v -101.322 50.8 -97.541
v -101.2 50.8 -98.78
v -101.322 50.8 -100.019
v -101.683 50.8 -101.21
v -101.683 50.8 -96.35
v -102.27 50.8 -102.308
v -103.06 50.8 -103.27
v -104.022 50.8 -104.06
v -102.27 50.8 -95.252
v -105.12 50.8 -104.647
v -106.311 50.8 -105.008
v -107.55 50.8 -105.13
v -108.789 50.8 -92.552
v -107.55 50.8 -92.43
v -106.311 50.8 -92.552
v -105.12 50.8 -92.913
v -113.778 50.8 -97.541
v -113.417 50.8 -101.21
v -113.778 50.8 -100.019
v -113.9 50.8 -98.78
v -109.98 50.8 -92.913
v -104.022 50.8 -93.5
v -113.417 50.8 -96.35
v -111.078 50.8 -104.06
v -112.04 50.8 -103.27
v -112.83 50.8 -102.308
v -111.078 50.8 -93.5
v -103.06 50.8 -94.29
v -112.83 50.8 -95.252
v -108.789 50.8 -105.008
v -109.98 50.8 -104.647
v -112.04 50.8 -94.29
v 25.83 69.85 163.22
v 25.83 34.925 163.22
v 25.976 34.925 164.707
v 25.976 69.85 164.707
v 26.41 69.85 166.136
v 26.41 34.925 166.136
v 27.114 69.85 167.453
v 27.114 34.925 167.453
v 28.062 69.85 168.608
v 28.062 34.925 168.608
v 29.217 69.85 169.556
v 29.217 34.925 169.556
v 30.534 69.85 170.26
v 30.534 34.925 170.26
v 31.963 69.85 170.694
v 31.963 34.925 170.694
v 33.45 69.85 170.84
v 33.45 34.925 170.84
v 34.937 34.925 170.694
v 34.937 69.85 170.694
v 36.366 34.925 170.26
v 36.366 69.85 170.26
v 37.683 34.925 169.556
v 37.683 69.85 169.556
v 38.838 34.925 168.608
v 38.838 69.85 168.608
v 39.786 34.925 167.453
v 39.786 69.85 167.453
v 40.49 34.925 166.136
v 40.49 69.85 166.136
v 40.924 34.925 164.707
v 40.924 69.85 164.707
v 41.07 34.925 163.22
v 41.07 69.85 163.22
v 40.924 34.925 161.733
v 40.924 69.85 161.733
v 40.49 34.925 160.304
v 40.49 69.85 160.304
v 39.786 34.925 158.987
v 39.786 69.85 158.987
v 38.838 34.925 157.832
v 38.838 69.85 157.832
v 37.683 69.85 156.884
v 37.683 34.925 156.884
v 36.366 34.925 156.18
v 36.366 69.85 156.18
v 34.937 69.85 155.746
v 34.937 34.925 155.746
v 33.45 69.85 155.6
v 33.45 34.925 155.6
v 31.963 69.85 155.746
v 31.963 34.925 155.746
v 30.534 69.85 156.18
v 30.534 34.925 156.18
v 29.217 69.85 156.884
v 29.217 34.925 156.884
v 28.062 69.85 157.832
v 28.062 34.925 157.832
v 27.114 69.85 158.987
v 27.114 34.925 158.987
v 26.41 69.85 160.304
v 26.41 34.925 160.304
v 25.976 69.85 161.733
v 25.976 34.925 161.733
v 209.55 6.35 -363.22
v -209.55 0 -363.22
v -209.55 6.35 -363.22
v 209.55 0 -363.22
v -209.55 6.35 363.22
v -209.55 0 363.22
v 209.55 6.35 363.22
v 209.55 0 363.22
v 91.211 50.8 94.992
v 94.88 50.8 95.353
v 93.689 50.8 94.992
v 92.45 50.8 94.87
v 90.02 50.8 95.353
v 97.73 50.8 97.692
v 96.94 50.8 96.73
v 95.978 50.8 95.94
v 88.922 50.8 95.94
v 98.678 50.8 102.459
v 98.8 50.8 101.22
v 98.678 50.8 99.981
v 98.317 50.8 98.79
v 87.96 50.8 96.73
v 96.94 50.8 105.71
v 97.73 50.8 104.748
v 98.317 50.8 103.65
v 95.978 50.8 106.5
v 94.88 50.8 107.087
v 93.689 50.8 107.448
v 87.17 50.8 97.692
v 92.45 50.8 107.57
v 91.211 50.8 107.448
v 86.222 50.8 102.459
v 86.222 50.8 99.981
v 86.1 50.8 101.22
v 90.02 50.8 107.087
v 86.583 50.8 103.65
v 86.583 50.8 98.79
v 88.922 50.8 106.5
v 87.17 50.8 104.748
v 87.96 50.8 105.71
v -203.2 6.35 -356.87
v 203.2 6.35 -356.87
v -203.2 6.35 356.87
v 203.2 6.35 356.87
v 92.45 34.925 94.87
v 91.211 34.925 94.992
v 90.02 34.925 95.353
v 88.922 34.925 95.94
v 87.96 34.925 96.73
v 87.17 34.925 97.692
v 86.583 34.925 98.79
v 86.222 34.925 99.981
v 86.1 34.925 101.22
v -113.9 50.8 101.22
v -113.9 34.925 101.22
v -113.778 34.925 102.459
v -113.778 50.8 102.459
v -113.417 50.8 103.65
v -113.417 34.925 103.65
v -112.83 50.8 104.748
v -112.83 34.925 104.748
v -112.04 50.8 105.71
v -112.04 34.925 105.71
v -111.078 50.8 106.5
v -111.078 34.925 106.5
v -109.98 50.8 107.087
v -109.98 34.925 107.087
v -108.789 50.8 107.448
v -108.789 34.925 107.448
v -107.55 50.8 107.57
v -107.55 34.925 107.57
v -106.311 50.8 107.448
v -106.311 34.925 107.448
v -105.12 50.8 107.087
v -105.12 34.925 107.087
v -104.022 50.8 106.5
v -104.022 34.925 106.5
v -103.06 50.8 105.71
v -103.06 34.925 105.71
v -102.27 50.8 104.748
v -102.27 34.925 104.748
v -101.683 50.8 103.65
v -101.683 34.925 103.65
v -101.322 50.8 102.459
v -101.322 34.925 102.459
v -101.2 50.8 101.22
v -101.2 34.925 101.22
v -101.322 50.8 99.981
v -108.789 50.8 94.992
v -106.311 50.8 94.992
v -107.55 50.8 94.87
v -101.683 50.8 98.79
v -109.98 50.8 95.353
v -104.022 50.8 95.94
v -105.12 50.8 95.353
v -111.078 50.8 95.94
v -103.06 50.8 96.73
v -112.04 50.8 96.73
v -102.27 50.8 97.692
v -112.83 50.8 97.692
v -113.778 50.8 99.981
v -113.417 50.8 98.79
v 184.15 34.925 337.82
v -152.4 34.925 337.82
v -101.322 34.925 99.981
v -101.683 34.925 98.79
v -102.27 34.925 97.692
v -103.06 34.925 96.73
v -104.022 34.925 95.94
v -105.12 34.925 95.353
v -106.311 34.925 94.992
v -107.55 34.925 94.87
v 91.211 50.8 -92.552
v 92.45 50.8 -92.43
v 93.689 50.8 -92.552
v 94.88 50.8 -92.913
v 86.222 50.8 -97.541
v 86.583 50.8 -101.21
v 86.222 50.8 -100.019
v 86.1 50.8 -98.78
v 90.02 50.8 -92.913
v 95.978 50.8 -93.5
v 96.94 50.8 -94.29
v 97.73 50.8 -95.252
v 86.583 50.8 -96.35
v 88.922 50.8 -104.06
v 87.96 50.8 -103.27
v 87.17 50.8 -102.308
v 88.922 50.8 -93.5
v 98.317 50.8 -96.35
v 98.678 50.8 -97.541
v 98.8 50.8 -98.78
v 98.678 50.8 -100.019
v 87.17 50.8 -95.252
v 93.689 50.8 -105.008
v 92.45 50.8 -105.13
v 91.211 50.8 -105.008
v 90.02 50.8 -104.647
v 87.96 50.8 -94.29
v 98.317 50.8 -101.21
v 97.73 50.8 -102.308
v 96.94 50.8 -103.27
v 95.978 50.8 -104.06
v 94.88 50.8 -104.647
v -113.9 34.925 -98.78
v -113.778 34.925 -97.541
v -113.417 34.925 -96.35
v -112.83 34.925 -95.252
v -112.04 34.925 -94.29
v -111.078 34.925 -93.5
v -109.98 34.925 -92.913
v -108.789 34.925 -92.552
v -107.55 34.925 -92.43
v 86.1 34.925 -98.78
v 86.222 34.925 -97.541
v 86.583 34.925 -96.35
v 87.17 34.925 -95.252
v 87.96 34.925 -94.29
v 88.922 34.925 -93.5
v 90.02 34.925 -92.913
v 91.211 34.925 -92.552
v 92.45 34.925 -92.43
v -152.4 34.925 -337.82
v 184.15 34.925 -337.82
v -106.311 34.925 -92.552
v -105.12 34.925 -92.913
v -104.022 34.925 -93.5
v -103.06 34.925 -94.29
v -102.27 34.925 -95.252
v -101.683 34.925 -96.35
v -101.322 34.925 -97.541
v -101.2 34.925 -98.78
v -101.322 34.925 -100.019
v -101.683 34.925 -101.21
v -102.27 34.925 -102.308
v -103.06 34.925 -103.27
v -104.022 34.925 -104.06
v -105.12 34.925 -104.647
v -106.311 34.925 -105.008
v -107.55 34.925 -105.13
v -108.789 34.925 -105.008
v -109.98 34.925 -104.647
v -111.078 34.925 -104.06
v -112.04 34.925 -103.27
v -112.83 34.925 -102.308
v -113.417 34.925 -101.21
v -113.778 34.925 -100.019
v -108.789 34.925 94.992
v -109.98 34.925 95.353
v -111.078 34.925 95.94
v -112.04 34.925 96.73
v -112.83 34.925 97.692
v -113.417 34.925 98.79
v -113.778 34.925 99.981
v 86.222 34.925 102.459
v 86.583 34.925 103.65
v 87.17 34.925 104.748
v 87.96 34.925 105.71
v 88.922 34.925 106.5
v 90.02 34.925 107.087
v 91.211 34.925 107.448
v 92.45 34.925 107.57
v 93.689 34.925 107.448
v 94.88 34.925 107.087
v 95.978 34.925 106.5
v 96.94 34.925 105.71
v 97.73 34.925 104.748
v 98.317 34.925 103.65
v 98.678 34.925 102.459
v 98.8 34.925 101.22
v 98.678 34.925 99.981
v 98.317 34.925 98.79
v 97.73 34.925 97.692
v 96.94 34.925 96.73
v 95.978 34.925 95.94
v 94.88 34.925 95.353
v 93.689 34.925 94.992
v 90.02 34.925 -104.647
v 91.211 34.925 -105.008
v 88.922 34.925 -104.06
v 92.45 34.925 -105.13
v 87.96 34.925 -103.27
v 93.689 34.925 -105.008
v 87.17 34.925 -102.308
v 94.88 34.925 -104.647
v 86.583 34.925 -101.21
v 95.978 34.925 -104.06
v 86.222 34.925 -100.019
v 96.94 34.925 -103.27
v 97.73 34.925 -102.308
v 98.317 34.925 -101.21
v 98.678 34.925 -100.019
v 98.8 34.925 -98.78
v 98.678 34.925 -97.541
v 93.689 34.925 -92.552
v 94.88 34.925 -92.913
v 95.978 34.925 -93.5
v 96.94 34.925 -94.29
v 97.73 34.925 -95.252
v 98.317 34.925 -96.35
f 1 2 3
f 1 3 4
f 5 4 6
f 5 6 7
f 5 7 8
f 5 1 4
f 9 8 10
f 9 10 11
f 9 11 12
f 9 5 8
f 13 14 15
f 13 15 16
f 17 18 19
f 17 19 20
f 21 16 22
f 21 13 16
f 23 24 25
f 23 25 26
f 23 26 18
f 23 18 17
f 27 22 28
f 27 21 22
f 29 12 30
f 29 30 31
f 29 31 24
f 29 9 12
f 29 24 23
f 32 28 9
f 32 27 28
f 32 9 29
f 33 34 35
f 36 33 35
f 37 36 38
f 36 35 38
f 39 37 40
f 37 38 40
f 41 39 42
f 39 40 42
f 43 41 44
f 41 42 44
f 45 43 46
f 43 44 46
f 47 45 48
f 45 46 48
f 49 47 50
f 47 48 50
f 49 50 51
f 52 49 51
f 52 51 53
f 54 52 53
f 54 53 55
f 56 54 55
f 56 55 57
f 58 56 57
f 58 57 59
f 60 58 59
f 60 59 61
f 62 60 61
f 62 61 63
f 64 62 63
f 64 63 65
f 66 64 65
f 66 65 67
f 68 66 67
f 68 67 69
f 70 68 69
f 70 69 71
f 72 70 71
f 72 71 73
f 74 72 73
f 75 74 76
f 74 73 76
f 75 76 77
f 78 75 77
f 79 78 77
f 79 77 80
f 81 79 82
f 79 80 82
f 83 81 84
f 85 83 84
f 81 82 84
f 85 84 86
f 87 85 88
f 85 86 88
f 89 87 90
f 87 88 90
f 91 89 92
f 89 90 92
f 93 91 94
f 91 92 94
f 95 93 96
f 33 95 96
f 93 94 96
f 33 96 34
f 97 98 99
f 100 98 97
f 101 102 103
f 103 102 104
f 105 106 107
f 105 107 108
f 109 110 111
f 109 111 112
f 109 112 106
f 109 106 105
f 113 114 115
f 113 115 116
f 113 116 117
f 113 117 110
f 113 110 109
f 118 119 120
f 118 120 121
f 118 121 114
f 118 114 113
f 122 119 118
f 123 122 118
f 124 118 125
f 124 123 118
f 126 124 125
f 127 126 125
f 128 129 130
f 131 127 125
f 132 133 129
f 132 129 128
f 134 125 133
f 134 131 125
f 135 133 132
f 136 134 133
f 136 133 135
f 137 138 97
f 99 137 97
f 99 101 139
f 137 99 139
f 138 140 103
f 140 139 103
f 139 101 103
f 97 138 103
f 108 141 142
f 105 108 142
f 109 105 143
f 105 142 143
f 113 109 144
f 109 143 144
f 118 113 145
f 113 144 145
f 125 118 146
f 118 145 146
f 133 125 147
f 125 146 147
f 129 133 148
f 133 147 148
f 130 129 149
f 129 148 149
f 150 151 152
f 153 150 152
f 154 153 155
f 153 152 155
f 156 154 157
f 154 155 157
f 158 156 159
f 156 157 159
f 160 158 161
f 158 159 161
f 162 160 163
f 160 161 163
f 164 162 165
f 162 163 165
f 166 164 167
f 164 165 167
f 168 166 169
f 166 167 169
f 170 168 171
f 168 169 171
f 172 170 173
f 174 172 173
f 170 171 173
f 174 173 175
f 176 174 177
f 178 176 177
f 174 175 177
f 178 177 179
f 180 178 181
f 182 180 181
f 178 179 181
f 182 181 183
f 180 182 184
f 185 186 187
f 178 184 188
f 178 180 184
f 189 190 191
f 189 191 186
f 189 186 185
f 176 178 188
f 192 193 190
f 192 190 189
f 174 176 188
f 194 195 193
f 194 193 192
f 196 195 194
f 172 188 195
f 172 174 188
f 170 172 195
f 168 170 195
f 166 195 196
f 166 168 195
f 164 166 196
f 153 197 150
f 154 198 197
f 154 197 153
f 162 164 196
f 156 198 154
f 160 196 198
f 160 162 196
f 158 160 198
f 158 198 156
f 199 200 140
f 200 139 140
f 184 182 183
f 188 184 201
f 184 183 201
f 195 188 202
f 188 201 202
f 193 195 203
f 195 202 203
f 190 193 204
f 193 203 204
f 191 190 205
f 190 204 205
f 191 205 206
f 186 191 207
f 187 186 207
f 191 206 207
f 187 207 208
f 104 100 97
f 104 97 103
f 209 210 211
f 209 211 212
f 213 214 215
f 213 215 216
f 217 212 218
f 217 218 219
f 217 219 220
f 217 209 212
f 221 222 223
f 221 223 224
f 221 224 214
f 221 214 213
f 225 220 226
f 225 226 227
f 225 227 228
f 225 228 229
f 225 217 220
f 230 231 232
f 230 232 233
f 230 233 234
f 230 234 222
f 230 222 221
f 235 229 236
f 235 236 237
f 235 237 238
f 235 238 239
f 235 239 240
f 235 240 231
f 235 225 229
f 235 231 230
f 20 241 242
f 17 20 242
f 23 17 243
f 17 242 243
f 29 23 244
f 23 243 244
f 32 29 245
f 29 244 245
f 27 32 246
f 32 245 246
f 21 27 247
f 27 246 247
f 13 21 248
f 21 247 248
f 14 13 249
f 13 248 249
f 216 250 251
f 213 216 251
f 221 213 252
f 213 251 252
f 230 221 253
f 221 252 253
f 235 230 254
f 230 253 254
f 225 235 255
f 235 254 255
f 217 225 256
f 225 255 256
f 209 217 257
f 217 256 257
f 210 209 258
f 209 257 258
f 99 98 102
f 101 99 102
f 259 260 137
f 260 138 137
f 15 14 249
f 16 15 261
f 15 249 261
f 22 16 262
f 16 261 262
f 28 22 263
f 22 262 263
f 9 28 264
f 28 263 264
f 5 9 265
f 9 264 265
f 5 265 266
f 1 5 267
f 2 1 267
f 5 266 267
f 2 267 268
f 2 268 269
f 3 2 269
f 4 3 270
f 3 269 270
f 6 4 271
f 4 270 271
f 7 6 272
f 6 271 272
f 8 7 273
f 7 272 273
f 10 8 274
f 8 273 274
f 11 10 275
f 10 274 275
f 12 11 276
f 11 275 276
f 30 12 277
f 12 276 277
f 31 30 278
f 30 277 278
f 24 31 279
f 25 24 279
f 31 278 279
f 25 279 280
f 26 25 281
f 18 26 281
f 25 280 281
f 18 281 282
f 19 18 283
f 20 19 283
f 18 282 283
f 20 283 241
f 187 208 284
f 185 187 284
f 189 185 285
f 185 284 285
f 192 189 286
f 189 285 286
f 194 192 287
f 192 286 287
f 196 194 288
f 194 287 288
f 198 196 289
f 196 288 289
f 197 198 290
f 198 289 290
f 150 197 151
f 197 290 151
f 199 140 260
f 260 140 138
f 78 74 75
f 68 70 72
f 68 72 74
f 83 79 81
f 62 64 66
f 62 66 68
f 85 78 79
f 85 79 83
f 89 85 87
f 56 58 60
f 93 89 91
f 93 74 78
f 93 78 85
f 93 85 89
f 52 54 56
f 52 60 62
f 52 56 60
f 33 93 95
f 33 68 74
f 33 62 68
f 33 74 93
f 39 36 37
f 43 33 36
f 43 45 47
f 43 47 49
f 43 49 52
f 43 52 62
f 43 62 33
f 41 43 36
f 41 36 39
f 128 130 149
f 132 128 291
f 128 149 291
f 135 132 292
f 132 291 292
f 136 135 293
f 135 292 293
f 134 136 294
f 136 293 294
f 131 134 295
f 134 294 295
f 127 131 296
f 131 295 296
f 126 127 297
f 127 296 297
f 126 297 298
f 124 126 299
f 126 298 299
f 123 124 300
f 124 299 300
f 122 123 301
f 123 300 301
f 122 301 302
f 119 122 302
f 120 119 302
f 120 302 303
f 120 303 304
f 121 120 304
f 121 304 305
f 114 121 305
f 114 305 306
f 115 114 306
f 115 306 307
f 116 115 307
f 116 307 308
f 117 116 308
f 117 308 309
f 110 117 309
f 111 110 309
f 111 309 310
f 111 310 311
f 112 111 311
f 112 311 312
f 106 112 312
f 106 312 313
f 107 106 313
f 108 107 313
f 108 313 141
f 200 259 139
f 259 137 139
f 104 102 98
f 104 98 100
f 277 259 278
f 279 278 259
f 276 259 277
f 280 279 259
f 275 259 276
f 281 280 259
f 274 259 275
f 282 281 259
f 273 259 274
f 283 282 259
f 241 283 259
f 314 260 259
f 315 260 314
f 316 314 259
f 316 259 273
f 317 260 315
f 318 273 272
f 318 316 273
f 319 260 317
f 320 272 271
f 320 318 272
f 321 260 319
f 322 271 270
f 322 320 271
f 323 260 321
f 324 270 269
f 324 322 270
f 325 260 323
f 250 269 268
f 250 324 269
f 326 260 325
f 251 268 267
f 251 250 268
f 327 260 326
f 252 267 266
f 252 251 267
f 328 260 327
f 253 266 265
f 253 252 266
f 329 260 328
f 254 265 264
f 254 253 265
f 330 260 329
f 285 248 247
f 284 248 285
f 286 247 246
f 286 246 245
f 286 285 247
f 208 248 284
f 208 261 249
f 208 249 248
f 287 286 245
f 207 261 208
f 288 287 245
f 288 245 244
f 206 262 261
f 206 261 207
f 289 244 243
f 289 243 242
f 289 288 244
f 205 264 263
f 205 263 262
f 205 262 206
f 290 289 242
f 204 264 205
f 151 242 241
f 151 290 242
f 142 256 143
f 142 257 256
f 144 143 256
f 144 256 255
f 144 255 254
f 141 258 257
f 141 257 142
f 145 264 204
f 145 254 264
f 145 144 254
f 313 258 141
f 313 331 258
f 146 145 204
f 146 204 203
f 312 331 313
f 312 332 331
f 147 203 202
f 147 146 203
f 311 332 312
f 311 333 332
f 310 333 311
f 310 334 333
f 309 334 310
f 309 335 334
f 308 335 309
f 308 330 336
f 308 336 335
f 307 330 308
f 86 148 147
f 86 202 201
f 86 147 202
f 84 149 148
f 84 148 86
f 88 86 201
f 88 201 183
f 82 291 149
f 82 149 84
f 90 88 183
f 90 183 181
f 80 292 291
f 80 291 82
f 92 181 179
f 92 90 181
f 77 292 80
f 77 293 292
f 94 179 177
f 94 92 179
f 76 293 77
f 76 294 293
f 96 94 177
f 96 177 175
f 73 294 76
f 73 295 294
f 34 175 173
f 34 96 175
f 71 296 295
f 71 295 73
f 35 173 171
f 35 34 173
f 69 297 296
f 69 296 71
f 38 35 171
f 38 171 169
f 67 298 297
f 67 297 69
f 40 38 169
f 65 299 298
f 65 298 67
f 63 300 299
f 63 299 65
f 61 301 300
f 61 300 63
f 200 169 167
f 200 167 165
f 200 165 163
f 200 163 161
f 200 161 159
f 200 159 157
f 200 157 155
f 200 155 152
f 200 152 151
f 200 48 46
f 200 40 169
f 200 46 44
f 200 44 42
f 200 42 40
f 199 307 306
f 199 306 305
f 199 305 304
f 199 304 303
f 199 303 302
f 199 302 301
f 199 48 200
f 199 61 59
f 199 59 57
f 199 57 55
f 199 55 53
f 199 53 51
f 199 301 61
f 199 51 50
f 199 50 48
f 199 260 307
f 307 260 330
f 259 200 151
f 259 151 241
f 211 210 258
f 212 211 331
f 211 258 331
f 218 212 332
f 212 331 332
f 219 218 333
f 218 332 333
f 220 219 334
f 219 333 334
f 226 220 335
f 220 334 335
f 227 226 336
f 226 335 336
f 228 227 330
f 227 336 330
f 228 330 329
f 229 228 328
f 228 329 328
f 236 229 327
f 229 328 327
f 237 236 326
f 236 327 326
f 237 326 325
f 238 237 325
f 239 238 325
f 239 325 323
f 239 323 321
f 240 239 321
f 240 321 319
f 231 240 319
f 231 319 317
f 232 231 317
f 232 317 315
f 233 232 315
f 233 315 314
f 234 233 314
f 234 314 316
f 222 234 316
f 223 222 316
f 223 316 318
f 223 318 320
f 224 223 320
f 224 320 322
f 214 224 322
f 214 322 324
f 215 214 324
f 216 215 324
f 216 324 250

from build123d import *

# Parameters (mm, degrees)
F0_W      = 419.1
F0_H      = 726.44
F1_DEPTH  = 6.35
F4_DEPTH  = 44.45
F5_R      = 7.62
F6_DEPTH  = 63.5
F8_W      = 336.55
F8_H      = 675.64
F9_W      = 406.4
F9_H      = 713.74
F11_DEPTH = 28.575


with BuildPart() as f1:
    # F0 (on Front) → F1 (new body)
    with BuildSketch(Plane.XZ):
        Rectangle(F0_W, F0_H)
    extrude(amount=-F1_DEPTH)

    # F2 (on face) → F4 (join)
    with BuildSketch(Plane(origin=(0, 6.35, 0), x_dir=(-1, 0, 0), z_dir=(0, 1, 0))):
        with BuildLine():
            ThreePointArc((113.9, 101.22), (107.55, 107.57), (101.2, 101.22))
            Line((101.2, 101.22), (107.55, 101.22))
            Line((107.55, 101.22), (107.55, 94.87))
            ThreePointArc((107.55, 94.87), (112.0401280605, 96.7298719395), (113.9, 101.22))
        make_face()
        with BuildLine():
            Line((107.55, 101.22), (101.2, 101.22))
            ThreePointArc((101.2, 101.22), (103.0598719395, 96.7298719395), (107.55, 94.87))
            Line((107.55, 94.87), (107.55, 101.22))
        make_face()
        with BuildLine():
            Line((-92.45, 101.22), (-86.1, 101.22))
            ThreePointArc((-86.1, 101.22), (-96.9401280605, 105.7101280605), (-92.45, 94.87))
            Line((-92.45, 94.87), (-92.45, 101.22))
        make_face()
        with BuildLine():
            ThreePointArc((-92.45, 94.87), (-87.9598719395, 96.7298719395), (-86.1, 101.22))
            Line((-86.1, 101.22), (-92.45, 101.22))
            Line((-92.45, 101.22), (-92.45, 94.87))
        make_face()
        with BuildLine():
            Line((107.55, -98.78), (107.55, -92.43))
            ThreePointArc((107.55, -92.43), (103.0598719395, -94.2898719395), (101.2, -98.78))
            Line((101.2, -98.78), (107.55, -98.78))
        make_face()
        with BuildLine():
            ThreePointArc((113.9, -98.78), (112.0401280605, -94.2898719395), (107.55, -92.43))
            Line((107.55, -92.43), (107.55, -98.78))
            Line((107.55, -98.78), (101.2, -98.78))
            ThreePointArc((101.2, -98.78), (107.55, -105.13), (113.9, -98.78))
        make_face()
        with BuildLine():
            ThreePointArc((-86.1, -98.78), (-87.9598719395, -94.2898719395), (-92.45, -92.43))
            Line((-92.45, -92.43), (-92.45, -98.78))
            Line((-92.45, -98.78), (-86.1, -98.78))
        make_face()
        with BuildLine():
            Line((-92.45, -98.78), (-92.45, -92.43))
            ThreePointArc((-92.45, -92.43), (-96.9401280605, -103.2701280605), (-86.1, -98.78))
            Line((-86.1, -98.78), (-92.45, -98.78))
        make_face()
    extrude(amount=F4_DEPTH)

    # F5 (on face) → F6 (join)
    with BuildSketch(Plane(origin=(0, 6.35, 0), x_dir=(-1, 0, 0), z_dir=(0, 1, 0))):
        with Locations((-33.45, 163.22)):
            Circle(F5_R)
    extrude(amount=F6_DEPTH)

    # F8 (on offset) → F10 section 0
    with BuildSketch(Plane(origin=(0, 34.925, 0), x_dir=(-1, 0, 0), z_dir=(0, 1, 0))):
        with Locations((-15.875, 0)):
            Rectangle(F8_W, F8_H)
    # F9 (on face) → F10 section 1
    with BuildSketch(Plane(origin=(0, 6.35, 0), x_dir=(-1, 0, 0), z_dir=(0, 1, 0))):
        Rectangle(F9_W, F9_H)
    loft()

    # F8 (on offset) → F11 (join)
    with BuildSketch(Plane(origin=(0, 34.925, 0), x_dir=(-1, 0, 0), z_dir=(0, 1, 0))):
        with Locations((-15.875, 0)):
            Rectangle(F8_W, F8_H)
    extrude(amount=-F11_DEPTH)


solid = f1.part
